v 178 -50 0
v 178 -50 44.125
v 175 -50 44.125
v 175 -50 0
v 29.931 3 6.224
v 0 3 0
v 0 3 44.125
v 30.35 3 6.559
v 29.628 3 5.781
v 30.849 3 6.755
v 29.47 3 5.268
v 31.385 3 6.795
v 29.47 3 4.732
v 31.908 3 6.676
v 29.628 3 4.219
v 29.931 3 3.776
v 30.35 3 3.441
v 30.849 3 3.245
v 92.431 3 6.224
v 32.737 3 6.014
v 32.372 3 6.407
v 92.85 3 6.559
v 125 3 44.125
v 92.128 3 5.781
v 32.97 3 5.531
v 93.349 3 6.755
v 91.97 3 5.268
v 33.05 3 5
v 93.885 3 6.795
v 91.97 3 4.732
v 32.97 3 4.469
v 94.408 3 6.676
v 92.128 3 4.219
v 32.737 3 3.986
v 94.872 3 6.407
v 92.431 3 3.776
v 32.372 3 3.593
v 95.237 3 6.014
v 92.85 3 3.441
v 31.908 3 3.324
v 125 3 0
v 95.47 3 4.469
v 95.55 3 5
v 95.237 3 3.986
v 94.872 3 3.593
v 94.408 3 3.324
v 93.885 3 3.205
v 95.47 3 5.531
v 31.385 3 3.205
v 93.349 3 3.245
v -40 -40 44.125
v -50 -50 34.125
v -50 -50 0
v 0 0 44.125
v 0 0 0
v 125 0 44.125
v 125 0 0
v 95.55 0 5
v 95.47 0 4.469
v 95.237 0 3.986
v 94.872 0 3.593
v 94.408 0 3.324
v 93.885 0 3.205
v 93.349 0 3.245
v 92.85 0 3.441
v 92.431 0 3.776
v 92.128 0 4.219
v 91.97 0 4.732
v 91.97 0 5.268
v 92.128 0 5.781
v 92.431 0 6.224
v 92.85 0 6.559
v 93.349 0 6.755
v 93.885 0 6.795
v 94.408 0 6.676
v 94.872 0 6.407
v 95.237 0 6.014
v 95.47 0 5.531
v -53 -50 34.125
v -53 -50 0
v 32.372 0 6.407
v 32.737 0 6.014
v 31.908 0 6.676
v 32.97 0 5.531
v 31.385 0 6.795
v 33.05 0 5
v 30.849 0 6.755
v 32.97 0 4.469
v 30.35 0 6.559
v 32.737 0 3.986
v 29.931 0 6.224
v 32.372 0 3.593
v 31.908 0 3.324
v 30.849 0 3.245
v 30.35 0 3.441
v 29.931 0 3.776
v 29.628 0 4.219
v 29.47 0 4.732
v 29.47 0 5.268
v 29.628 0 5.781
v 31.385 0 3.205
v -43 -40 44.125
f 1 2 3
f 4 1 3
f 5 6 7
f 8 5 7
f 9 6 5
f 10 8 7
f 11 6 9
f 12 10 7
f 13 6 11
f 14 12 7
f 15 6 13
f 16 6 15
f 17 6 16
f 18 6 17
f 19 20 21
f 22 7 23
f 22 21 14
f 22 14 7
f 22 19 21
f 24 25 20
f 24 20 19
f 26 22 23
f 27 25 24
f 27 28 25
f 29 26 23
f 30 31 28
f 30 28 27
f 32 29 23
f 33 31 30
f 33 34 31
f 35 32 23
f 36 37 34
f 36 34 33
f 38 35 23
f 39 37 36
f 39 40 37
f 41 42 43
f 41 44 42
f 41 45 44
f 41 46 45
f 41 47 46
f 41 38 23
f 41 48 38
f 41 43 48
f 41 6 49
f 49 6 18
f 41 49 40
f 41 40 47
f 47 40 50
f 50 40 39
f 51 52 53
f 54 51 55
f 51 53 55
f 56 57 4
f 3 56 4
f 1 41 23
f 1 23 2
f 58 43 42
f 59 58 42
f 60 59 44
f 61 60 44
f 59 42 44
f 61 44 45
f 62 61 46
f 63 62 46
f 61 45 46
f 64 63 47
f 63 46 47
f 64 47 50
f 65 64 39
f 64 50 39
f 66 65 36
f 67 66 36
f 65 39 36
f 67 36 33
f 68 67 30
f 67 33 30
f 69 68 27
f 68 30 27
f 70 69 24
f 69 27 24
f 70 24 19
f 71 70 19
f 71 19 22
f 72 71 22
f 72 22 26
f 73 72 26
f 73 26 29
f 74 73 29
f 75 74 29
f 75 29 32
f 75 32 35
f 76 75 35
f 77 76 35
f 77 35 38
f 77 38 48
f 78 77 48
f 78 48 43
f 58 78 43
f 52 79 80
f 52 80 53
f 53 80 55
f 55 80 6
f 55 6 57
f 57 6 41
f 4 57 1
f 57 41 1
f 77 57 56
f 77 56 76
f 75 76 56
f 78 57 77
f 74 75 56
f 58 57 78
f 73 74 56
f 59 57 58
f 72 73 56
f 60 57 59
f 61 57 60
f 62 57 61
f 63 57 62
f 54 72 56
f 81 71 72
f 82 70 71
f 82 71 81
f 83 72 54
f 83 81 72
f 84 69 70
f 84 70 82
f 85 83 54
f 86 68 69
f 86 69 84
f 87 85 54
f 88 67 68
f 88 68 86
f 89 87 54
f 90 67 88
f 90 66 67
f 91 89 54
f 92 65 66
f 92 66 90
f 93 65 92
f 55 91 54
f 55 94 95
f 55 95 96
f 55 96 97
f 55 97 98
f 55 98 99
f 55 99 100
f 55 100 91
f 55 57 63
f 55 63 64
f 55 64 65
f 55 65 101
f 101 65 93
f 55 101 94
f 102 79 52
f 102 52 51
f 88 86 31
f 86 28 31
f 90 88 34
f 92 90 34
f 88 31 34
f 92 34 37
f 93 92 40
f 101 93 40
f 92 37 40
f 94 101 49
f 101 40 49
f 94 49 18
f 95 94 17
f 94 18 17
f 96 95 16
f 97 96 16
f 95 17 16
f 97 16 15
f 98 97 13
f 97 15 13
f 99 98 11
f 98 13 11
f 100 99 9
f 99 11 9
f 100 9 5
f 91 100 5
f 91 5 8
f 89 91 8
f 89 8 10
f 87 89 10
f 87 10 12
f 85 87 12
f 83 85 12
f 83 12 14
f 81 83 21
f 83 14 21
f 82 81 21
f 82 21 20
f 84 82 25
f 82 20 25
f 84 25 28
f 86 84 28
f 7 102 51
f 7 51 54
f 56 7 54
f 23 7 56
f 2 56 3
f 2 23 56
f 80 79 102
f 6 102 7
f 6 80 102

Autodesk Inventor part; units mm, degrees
ref_plane "YZ Plane" through (0, 0, 0) normal (1, 0, 0) x (0, 1, 0)
ref_plane "XZ Plane" through (0, 0, 0) normal (0, 1, 0) x (-1, 0, 0)
ref_plane "XY Plane" through (0, 0, 0) normal (0, 0, 1) x (1, 0, 0)
sketch "Sketch1" plane through (0, 0, 0) normal (0, 0, 1) x (1, 0, 0)
  line L0 (-50, -50) -> (0, 0)
  line L1 (125, 0) -> (0, 0)
  line L2 (125, 0) -> (175, -50)
  line L3 (178, -50) -> (175, -50)
  line L4 (-53, -50) -> (-50, -50)
  circle A0 centre (117.5, -37.5) radius 1.5
  arc A1 (114.25, -43.8002) -> (114.25, -56.1998) centre (117.5, -50) ccw
  arc A2 (120.75, -56.1998) -> (120.75, -43.8002) centre (117.5, -50) ccw
  line L5 (-53, -50) -> (0, 3)
  line L6 (0, 3) -> (125, 3)
  line L7 (125, 3) -> (178, -50)
extrude "Extrusion1" add sketch "Sketch1" along normal blind 44.125 contours L4 L5 L6 L7 L3 L2 L1 L0
sketch "Sketch2" plane through (0, 3, 0) normal (0, 1, 0) x (1, 0, 0)
  line L0 (0, 0) -> (125, 0)
  line L1 (125, -10) -> (0, -10)
  circle A0 centre (31.25, -5) radius 1.8
  circle A1 centre (93.75, -5) radius 1.8
  line L2 (-53, 32.375) -> (-53, -10)
  line L3 (-53, -10) -> (-50, -10)
  line L4 (-50, -10) -> (0, -10)
  line L5 (0, 0) -> (-53, 0) projected
  line L6 (-53, 0) -> (-53, -44.125) projected
  line L7 (0, -44.125) -> (-53, -44.125) projected
  line L8 (0, 0) -> (0, -44.125) projected
  circle A2 centre (31.25, -5) radius 1.6
  circle A3 centre (93.75, -5) radius 1.6
  line L9 (125, 0) -> (0, 0) projected
  line L10 (0, 0) -> (0, -44.125) projected
  line L11 (125, -44.125) -> (0, -44.125) projected
  line L12 (125, 0) -> (125, -44.125) projected
  dimension "d2" = 3.2
  dimension "d3" = 3.2
extrude "Extrusion2" cut sketch "Sketch2" against normal up to surface (3 mm away) contours A0 | A1 | A2 | A3
chamfer "Chamfer2" distance 10 angle 45 1 edges at (-51.5, -50, 44.125)
properties part number "obudowa_górna_dluga" material "ABS Plastic"
